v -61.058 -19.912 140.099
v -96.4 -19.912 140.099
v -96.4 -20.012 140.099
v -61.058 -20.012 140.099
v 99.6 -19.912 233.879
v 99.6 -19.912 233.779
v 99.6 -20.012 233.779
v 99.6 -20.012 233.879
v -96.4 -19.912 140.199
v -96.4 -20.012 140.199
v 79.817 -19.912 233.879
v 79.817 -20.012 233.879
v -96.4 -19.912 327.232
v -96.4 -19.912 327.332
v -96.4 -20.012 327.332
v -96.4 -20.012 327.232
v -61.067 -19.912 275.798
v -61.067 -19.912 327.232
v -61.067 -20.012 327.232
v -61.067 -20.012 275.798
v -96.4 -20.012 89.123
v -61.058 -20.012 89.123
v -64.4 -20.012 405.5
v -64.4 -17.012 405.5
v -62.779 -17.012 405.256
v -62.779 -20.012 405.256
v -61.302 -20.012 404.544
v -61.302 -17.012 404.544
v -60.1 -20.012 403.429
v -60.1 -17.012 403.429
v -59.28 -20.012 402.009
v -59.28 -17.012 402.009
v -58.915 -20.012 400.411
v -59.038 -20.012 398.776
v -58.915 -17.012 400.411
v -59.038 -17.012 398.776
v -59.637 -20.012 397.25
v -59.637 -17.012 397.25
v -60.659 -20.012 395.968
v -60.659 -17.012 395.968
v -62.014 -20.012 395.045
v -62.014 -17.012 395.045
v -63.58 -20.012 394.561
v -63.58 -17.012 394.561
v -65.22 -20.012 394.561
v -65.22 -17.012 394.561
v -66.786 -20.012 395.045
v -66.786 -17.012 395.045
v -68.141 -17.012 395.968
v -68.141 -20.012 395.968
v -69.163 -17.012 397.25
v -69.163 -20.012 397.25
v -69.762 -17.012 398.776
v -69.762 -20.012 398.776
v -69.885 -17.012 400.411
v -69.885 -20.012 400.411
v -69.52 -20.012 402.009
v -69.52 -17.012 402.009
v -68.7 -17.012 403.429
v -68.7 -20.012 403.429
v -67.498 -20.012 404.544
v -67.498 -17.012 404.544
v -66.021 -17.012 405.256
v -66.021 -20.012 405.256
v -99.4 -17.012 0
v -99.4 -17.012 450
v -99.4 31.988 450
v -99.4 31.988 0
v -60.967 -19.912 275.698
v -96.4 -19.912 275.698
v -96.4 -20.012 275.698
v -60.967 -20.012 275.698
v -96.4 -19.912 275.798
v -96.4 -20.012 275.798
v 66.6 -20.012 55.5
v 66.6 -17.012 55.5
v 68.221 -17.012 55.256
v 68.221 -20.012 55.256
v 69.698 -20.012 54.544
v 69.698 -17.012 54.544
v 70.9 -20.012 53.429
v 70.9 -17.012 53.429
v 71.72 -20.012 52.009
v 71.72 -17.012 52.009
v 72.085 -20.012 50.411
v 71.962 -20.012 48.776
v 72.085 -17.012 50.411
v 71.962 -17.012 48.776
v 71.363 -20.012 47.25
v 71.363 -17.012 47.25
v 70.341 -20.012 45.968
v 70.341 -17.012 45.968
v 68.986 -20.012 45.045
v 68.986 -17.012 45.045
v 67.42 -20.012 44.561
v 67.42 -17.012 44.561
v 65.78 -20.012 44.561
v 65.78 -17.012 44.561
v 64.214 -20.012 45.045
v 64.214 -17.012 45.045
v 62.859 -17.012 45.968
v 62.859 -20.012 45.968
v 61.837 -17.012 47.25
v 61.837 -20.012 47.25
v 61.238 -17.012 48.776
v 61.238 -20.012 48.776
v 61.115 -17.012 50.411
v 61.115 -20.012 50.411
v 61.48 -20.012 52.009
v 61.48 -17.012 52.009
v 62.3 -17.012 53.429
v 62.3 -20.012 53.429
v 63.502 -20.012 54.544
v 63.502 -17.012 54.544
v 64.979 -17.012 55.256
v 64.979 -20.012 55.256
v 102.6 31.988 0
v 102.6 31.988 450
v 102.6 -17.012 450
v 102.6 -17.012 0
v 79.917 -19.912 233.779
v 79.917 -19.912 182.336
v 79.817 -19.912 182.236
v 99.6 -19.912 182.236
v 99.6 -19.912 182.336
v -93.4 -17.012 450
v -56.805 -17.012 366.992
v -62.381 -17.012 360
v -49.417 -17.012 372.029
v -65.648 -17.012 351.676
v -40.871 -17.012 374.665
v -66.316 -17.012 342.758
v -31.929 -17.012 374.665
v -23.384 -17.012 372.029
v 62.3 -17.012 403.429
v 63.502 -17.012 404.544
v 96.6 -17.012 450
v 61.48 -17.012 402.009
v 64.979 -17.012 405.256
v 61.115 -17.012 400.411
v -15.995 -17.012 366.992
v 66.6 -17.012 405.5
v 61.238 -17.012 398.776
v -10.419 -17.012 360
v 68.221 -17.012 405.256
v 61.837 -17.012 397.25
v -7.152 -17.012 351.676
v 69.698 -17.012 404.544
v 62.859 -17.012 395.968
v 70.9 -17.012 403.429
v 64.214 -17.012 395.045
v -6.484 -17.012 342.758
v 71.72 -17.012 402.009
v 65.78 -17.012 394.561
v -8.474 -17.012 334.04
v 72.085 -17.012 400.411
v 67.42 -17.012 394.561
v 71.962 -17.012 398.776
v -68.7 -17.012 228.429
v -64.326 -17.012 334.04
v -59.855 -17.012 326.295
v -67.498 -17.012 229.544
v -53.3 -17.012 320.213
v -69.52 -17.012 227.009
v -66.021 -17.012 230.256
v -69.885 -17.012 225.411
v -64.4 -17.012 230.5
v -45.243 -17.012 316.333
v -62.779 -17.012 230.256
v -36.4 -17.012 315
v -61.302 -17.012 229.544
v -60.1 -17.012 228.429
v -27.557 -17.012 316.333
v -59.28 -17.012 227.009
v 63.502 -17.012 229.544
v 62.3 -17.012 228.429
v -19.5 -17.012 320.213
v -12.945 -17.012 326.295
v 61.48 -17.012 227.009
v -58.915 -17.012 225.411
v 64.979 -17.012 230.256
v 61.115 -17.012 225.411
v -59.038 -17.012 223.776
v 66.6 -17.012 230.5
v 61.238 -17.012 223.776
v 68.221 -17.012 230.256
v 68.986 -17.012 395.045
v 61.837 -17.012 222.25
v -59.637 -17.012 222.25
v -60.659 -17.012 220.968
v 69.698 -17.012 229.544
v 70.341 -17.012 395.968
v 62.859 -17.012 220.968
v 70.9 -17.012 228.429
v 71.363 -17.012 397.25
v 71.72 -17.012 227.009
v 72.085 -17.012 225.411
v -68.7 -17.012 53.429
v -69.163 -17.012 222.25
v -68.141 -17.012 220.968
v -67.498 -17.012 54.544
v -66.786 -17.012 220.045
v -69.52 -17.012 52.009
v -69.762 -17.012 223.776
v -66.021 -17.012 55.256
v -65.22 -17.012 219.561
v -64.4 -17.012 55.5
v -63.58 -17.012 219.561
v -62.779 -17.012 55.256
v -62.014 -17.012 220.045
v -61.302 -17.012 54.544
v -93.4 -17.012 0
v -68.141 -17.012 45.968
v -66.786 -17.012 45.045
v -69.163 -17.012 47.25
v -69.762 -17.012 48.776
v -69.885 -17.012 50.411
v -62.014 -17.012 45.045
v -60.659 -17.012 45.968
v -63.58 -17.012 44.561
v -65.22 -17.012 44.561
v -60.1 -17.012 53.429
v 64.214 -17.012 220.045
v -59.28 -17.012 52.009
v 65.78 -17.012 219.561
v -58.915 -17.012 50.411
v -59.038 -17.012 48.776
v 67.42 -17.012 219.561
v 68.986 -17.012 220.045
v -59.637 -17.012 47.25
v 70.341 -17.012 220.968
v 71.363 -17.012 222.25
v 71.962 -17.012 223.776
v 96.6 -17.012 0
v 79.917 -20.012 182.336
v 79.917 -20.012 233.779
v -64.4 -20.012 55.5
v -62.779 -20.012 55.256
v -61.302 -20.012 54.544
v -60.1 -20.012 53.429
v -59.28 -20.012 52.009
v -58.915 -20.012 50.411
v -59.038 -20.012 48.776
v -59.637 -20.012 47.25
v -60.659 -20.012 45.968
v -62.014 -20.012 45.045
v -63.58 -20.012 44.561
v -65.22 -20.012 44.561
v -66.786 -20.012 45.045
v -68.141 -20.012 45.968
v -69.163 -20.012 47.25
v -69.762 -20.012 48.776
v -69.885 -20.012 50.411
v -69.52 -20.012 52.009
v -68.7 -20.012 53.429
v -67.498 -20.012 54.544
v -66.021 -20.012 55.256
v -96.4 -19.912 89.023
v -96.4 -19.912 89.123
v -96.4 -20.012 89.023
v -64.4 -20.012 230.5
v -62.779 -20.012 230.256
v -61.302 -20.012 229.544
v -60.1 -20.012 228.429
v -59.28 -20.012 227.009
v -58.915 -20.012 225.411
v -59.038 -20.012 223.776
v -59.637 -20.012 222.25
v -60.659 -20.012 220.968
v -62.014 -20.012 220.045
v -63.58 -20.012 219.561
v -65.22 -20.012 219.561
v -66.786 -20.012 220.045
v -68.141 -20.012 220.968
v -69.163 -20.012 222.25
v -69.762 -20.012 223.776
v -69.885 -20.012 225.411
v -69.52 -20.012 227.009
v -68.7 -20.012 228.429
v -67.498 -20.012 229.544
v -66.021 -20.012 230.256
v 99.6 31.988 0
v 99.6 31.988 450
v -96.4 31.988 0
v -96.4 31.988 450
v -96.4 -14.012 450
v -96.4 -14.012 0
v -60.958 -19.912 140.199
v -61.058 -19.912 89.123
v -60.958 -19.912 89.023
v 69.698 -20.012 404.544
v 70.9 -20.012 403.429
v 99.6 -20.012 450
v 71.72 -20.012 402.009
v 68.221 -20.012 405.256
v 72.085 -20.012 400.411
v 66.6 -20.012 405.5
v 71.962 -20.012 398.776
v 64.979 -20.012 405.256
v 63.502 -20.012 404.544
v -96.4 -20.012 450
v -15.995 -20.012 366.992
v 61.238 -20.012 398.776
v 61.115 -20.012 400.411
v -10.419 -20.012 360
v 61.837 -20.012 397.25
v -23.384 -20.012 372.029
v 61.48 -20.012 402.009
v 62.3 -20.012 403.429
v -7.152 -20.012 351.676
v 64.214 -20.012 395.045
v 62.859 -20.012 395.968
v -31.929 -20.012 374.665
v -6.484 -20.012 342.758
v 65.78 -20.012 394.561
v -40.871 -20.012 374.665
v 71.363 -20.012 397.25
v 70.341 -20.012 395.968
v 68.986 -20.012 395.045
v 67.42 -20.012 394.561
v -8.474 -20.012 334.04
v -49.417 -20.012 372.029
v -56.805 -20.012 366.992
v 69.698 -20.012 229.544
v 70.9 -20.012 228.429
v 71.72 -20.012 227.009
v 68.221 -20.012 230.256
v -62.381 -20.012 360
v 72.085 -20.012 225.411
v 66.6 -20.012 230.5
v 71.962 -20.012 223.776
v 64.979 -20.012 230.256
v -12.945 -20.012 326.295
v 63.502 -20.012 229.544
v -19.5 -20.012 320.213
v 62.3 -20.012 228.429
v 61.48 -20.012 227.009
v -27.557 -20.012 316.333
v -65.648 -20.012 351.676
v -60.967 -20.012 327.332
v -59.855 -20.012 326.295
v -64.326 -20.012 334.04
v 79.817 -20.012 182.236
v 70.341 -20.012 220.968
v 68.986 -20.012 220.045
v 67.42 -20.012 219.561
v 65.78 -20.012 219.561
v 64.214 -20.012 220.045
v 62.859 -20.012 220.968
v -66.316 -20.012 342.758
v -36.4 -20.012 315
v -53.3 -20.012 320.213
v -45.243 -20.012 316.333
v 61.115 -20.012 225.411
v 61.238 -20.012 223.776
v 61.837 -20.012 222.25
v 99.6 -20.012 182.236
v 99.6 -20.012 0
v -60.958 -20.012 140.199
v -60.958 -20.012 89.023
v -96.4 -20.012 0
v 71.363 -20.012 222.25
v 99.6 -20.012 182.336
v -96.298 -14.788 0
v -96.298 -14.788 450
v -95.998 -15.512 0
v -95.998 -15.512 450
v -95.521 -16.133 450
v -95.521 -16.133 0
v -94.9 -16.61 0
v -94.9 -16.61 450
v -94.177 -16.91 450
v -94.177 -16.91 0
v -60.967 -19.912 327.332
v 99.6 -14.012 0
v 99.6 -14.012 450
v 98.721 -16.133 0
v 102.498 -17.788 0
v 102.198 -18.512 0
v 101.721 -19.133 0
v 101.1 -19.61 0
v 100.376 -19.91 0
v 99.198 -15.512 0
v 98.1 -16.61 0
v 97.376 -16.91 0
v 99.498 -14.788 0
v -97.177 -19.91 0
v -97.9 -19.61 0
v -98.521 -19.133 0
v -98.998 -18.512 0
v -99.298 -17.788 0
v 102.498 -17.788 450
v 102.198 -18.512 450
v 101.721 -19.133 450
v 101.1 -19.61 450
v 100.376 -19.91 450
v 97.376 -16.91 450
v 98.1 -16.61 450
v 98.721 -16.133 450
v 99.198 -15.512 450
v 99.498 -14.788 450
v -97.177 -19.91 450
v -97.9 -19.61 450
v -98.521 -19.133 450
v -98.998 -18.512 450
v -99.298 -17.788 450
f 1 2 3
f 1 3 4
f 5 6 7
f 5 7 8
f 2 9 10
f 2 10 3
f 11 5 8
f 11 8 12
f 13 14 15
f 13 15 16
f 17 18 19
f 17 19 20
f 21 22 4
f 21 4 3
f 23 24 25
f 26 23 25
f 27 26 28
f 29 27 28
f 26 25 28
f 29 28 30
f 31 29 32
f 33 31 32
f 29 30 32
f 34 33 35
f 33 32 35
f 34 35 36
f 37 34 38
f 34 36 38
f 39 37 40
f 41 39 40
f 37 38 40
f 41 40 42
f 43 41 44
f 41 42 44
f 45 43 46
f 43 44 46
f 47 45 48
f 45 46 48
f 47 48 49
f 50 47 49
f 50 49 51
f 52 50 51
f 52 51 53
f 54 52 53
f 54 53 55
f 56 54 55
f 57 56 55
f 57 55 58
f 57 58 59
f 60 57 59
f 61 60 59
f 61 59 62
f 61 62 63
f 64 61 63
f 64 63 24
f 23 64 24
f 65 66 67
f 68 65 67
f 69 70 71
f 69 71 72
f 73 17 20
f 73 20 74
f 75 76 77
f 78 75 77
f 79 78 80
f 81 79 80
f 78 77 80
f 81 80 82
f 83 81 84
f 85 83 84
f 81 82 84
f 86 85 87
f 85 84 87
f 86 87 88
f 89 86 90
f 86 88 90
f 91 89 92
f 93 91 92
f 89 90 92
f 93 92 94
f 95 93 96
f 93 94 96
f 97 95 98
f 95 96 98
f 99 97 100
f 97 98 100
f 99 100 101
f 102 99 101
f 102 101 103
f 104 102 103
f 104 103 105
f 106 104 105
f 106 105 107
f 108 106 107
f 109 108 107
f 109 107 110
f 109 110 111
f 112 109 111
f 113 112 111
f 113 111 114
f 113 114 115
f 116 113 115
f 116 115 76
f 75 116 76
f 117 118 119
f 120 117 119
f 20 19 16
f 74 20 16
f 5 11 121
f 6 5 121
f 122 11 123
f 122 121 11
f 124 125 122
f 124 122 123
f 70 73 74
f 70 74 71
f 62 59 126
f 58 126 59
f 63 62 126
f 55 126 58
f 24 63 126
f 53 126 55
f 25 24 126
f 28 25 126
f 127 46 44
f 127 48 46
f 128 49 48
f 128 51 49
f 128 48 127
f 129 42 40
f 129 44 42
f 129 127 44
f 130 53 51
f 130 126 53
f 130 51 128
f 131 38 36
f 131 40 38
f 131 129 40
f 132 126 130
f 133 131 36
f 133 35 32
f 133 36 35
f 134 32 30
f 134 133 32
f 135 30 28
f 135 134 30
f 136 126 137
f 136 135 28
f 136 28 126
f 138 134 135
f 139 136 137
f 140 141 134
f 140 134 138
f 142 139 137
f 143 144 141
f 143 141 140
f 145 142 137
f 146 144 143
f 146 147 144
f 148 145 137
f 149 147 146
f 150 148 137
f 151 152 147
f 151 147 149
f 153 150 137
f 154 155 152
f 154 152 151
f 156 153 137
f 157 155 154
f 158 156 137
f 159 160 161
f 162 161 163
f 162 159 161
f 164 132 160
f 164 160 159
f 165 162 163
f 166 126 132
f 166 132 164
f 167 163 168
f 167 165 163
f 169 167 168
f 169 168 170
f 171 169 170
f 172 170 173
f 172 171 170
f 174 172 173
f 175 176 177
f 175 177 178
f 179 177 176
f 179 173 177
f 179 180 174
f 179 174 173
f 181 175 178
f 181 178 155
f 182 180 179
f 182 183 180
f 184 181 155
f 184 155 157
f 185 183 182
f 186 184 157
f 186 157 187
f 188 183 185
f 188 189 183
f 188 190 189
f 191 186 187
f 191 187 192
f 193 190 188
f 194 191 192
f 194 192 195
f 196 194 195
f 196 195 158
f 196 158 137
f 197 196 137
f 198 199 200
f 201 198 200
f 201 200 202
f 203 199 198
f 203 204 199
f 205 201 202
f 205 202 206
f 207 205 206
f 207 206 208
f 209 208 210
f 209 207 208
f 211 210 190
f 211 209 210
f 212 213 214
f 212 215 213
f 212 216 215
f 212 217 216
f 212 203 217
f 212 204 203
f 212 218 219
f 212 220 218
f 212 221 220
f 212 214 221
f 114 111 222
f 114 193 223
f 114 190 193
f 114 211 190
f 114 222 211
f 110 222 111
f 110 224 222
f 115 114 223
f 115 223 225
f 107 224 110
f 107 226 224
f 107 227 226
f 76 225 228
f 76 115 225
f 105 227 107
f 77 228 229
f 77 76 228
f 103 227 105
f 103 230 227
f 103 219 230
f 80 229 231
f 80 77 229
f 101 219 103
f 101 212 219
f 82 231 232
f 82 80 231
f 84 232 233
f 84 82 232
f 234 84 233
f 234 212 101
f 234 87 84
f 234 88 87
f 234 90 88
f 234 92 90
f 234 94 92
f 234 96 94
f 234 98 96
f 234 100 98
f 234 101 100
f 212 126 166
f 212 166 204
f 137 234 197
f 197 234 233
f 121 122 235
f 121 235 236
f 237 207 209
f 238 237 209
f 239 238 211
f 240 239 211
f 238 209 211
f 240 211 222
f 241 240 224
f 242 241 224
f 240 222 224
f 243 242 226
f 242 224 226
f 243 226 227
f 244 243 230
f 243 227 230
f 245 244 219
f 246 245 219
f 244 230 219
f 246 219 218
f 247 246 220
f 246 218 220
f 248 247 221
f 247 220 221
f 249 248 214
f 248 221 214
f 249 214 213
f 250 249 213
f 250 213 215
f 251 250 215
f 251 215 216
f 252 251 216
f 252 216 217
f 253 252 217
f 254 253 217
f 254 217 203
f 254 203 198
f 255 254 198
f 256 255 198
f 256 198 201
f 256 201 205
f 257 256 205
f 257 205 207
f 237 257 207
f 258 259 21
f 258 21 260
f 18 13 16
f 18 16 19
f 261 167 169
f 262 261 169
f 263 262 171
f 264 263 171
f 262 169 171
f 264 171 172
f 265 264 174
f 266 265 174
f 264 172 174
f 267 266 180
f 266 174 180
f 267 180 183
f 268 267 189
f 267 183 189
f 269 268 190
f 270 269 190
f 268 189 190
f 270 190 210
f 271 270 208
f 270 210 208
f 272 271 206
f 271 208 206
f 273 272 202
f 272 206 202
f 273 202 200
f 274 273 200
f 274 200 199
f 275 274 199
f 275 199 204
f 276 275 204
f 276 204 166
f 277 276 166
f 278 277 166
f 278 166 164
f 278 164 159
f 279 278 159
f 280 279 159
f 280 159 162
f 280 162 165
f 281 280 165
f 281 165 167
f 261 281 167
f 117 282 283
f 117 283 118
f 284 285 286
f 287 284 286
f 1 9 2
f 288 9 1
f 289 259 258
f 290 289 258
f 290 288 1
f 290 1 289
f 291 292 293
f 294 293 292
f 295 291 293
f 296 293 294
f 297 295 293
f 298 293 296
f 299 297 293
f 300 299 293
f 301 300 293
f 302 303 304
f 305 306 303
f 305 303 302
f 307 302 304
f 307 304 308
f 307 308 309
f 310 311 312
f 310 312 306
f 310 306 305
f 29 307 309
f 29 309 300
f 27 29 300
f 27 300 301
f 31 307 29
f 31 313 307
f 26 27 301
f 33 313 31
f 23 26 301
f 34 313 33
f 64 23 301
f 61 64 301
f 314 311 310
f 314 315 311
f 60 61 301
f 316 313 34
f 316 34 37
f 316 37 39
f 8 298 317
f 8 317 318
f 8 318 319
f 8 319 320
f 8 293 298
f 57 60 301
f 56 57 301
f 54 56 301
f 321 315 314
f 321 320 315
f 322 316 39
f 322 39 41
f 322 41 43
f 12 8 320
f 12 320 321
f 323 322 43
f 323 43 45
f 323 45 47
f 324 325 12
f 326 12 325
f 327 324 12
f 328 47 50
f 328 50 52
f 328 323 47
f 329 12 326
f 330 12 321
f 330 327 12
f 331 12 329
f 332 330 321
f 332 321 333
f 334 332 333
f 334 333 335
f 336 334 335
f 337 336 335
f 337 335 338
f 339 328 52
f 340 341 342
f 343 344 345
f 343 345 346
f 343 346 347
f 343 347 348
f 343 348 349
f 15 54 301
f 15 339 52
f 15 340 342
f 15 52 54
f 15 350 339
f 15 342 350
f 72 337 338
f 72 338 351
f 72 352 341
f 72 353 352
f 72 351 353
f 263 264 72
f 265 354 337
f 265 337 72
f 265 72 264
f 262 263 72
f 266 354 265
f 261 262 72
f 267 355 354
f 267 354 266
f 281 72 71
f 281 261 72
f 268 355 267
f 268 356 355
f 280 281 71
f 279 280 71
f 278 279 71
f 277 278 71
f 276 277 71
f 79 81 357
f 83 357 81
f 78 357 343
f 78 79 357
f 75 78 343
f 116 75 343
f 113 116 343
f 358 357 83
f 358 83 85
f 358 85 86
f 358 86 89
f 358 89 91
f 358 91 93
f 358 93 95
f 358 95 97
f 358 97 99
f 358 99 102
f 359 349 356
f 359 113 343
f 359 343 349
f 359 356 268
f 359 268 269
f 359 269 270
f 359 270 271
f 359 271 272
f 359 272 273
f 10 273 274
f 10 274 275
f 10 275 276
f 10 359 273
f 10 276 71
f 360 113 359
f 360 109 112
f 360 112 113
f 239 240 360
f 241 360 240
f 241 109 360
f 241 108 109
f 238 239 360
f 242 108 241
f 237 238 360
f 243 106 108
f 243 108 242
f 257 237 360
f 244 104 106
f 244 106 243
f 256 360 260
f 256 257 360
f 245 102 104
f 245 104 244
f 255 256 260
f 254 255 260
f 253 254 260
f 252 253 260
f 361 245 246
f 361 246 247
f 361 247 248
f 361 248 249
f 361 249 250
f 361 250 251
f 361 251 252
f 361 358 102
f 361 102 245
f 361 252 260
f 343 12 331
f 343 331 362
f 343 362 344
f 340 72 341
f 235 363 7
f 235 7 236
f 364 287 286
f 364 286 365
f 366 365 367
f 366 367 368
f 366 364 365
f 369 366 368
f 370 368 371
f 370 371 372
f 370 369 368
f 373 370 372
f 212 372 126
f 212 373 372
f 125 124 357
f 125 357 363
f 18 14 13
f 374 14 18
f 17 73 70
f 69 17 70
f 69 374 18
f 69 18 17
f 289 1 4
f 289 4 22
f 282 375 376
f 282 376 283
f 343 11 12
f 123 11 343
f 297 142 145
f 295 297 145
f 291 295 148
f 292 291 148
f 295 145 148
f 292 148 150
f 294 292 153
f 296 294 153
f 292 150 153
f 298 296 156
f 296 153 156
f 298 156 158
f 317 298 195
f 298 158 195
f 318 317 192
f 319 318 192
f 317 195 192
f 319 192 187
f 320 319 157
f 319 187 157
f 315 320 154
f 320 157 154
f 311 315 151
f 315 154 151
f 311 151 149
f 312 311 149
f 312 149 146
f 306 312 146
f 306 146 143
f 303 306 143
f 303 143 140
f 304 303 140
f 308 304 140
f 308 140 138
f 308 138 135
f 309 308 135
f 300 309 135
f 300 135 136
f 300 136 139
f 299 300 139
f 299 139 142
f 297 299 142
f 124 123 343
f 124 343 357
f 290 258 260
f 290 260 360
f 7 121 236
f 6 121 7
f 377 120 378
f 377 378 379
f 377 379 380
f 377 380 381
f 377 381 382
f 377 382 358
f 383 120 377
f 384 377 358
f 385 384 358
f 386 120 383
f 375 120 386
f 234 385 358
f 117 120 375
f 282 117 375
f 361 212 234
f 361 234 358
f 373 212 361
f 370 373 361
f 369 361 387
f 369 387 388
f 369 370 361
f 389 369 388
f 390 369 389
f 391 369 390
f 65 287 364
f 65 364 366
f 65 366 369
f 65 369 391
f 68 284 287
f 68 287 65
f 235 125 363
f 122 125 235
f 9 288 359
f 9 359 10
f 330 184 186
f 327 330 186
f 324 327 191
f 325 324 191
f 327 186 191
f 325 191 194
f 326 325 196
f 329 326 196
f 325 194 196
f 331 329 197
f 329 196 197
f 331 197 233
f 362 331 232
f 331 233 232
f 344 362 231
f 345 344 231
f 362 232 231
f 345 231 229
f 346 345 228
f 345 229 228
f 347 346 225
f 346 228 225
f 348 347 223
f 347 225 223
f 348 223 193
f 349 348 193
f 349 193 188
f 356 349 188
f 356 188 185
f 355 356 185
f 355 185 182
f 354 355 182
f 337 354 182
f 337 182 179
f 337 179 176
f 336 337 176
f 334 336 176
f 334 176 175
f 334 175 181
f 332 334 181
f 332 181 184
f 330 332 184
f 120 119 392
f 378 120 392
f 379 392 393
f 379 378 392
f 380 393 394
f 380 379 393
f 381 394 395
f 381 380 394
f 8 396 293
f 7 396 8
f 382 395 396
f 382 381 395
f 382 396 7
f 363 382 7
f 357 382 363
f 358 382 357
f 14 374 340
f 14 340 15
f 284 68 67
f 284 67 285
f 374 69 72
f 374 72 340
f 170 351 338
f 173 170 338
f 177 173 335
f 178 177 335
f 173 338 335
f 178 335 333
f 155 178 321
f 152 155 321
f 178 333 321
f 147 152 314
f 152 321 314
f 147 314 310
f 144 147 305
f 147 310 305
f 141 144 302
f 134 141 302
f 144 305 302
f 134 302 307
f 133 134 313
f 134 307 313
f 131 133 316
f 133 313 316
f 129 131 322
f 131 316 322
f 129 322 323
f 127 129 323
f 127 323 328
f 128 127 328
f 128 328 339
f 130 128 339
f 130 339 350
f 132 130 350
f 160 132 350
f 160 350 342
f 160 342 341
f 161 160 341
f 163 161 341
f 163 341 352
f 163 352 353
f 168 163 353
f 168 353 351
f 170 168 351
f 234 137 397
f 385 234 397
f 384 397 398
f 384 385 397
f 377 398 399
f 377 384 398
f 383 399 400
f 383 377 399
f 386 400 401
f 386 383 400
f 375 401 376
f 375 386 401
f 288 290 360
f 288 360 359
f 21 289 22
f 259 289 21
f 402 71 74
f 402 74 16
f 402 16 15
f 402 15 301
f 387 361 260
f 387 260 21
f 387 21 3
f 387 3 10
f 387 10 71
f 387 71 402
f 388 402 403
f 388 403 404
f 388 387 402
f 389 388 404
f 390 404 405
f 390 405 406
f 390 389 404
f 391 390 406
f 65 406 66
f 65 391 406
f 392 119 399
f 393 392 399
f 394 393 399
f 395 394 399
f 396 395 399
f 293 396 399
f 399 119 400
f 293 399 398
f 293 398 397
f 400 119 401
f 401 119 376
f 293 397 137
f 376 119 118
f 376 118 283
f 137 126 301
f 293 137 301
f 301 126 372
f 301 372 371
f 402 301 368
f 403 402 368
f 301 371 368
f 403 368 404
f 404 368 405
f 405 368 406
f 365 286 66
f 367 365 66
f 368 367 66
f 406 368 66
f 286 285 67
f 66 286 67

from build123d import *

# Parameters (mm, degrees)
BOSS_EXTRUDE1_DEPTH          = 450
SKETCH3_R                    = 30
CUT_EXTRUDE2_DEPTH           = 609.050936432
M10_CLEARANCE_SLOT1_D        = 11
CUT_EXTRUDE_THIN4_DEPTH      = 609.050936432
CUT_EXTRUDE_THIN4_DEPTH_BACK = 0.1
CUT_EXTRUDE_THIN5_DEPTH      = 609.050936432
CUT_EXTRUDE_THIN5_DEPTH_BACK = 0.1
CUT_EXTRUDE_THIN6_DEPTH      = 609.050936432
CUT_EXTRUDE_THIN6_DEPTH_BACK = 0.1


with BuildPart() as part:
    # Sketch1 → Boss-Extrude1 (new body)
    with BuildSketch(Plane.XY):
        with BuildLine():
            Line((-96.40006218, 31.988224321), (-96.40006218, -14.011775679))
            ThreePointArc((-96.40006218, -14.011775679), (-95.521382524, -16.133096022), (-93.40006218, -17.011775679))
            Line((-93.40006218, -17.011775679), (96.59993782, -17.011775679))
            ThreePointArc((96.59993782, -17.011775679), (98.721258163, -16.133096022), (99.59993782, -14.011775679))
            Line((99.59993782, -14.011775679), (99.59993782, 31.988224321))
            Line((99.59993782, 31.988224321), (102.59993782, 31.988224321))
            Line((102.59993782, 31.988224321), (102.59993782, -17.011775679))
            ThreePointArc((102.59993782, -17.011775679), (101.721258163, -19.133096022), (99.59993782, -20.011775679))
            Line((99.59993782, -20.011775679), (-96.40006218, -20.011775679))
            ThreePointArc((-96.40006218, -20.011775679), (-98.521382524, -19.133096022), (-99.40006218, -17.011775679))
            Line((-99.40006218, -17.011775679), (-99.40006218, 31.988224321))
            Line((-99.40006218, 31.988224321), (-96.40006218, 31.988224321))
        make_face()
    extrude(amount=BOSS_EXTRUDE1_DEPTH)

    # Sketch3 → Cut-Extrude2 (cut, through all)
    with BuildSketch(Plane(origin=(-323.698265728, -20.011775679, 19.544679499), x_dir=(0, 0, -1), z_dir=(0, -1, 0))):
        with Locations((-325.455320501, 287.298203547)):
            Circle(SKETCH3_R)
    extrude(amount=-CUT_EXTRUDE2_DEPTH, mode=Mode.SUBTRACT)

    # M10 Clearance Slot1 (through all)
    with Locations(Plane(origin=(-323.698265728, -20.011775679, 19.544679499), x_dir=(0, 0, -1), z_dir=(0, -1, 0))):
        with Locations((-380.455320501, 390.298203547), (-205.455320501, 390.298203547), (-30.455320501, 390.298203547), (-30.455320501, 259.298203547), (-205.455320501, 259.298203547), (-380.455320501, 259.298203547)):
            Hole(M10_CLEARANCE_SLOT1_D / 2)

    # Sketch9 → Cut-Extrude-Thin4 (cut, two sides: drawn at the far end of the back side and taken through both)
    with BuildSketch(Plane(origin=(-323.698265728, -20.011775679, 19.544679499), x_dir=(0, 0, -1), z_dir=(0, -1, 0)).offset(-CUT_EXTRUDE_THIN4_DEPTH_BACK)):
        Polygon((-307.687440193, 227.298203547), (-307.687440193, 262.63145603), (-256.25354627, 262.63145603), (-256.25354627, 227.298203547), (-256.15354627, 227.298203547), (-256.15354627, 262.73145603), (-307.787440193, 262.73145603), (-307.787440193, 227.298203547), align=None)
    extrude(amount=CUT_EXTRUDE_THIN4_DEPTH + CUT_EXTRUDE_THIN4_DEPTH_BACK, mode=Mode.SUBTRACT)

    # Sketch10 → Cut-Extrude-Thin5 (cut, two sides: drawn at the far end of the back side and taken through both)
    with BuildSketch(Plane(origin=(-323.698265728, -20.011775679, 19.544679499), x_dir=(0, 0, -1), z_dir=(0, -1, 0)).offset(-CUT_EXTRUDE_THIN5_DEPTH_BACK)):
        Polygon((-69.477840086, 227.298203547), (-69.477840086, 262.740474595), (-120.654750778, 262.740474595), (-120.654750778, 227.298203547), (-120.554750778, 227.298203547), (-120.554750778, 262.640474595), (-69.577840086, 262.640474595), (-69.577840086, 227.298203547), align=None)
    extrude(amount=CUT_EXTRUDE_THIN5_DEPTH + CUT_EXTRUDE_THIN5_DEPTH_BACK, mode=Mode.SUBTRACT)

    # Sketch11 → Cut-Extrude-Thin6 (cut, two sides: drawn at the far end of the back side and taken through both)
    with BuildSketch(Plane(origin=(-323.698265728, -20.011775679, 19.544679499), x_dir=(0, 0, -1), z_dir=(0, -1, 0)).offset(-CUT_EXTRUDE_THIN6_DEPTH_BACK)):
        Polygon((-162.791670666, 423.298203547), (-162.791670666, 403.614782025), (-214.233995463, 403.614782025), (-214.233995463, 423.298203547), (-214.333995463, 423.298203547), (-214.333995463, 403.514782025), (-162.691670666, 403.514782025), (-162.691670666, 423.298203547), align=None)
    extrude(amount=CUT_EXTRUDE_THIN6_DEPTH + CUT_EXTRUDE_THIN6_DEPTH_BACK, mode=Mode.SUBTRACT)


solid = part.part
